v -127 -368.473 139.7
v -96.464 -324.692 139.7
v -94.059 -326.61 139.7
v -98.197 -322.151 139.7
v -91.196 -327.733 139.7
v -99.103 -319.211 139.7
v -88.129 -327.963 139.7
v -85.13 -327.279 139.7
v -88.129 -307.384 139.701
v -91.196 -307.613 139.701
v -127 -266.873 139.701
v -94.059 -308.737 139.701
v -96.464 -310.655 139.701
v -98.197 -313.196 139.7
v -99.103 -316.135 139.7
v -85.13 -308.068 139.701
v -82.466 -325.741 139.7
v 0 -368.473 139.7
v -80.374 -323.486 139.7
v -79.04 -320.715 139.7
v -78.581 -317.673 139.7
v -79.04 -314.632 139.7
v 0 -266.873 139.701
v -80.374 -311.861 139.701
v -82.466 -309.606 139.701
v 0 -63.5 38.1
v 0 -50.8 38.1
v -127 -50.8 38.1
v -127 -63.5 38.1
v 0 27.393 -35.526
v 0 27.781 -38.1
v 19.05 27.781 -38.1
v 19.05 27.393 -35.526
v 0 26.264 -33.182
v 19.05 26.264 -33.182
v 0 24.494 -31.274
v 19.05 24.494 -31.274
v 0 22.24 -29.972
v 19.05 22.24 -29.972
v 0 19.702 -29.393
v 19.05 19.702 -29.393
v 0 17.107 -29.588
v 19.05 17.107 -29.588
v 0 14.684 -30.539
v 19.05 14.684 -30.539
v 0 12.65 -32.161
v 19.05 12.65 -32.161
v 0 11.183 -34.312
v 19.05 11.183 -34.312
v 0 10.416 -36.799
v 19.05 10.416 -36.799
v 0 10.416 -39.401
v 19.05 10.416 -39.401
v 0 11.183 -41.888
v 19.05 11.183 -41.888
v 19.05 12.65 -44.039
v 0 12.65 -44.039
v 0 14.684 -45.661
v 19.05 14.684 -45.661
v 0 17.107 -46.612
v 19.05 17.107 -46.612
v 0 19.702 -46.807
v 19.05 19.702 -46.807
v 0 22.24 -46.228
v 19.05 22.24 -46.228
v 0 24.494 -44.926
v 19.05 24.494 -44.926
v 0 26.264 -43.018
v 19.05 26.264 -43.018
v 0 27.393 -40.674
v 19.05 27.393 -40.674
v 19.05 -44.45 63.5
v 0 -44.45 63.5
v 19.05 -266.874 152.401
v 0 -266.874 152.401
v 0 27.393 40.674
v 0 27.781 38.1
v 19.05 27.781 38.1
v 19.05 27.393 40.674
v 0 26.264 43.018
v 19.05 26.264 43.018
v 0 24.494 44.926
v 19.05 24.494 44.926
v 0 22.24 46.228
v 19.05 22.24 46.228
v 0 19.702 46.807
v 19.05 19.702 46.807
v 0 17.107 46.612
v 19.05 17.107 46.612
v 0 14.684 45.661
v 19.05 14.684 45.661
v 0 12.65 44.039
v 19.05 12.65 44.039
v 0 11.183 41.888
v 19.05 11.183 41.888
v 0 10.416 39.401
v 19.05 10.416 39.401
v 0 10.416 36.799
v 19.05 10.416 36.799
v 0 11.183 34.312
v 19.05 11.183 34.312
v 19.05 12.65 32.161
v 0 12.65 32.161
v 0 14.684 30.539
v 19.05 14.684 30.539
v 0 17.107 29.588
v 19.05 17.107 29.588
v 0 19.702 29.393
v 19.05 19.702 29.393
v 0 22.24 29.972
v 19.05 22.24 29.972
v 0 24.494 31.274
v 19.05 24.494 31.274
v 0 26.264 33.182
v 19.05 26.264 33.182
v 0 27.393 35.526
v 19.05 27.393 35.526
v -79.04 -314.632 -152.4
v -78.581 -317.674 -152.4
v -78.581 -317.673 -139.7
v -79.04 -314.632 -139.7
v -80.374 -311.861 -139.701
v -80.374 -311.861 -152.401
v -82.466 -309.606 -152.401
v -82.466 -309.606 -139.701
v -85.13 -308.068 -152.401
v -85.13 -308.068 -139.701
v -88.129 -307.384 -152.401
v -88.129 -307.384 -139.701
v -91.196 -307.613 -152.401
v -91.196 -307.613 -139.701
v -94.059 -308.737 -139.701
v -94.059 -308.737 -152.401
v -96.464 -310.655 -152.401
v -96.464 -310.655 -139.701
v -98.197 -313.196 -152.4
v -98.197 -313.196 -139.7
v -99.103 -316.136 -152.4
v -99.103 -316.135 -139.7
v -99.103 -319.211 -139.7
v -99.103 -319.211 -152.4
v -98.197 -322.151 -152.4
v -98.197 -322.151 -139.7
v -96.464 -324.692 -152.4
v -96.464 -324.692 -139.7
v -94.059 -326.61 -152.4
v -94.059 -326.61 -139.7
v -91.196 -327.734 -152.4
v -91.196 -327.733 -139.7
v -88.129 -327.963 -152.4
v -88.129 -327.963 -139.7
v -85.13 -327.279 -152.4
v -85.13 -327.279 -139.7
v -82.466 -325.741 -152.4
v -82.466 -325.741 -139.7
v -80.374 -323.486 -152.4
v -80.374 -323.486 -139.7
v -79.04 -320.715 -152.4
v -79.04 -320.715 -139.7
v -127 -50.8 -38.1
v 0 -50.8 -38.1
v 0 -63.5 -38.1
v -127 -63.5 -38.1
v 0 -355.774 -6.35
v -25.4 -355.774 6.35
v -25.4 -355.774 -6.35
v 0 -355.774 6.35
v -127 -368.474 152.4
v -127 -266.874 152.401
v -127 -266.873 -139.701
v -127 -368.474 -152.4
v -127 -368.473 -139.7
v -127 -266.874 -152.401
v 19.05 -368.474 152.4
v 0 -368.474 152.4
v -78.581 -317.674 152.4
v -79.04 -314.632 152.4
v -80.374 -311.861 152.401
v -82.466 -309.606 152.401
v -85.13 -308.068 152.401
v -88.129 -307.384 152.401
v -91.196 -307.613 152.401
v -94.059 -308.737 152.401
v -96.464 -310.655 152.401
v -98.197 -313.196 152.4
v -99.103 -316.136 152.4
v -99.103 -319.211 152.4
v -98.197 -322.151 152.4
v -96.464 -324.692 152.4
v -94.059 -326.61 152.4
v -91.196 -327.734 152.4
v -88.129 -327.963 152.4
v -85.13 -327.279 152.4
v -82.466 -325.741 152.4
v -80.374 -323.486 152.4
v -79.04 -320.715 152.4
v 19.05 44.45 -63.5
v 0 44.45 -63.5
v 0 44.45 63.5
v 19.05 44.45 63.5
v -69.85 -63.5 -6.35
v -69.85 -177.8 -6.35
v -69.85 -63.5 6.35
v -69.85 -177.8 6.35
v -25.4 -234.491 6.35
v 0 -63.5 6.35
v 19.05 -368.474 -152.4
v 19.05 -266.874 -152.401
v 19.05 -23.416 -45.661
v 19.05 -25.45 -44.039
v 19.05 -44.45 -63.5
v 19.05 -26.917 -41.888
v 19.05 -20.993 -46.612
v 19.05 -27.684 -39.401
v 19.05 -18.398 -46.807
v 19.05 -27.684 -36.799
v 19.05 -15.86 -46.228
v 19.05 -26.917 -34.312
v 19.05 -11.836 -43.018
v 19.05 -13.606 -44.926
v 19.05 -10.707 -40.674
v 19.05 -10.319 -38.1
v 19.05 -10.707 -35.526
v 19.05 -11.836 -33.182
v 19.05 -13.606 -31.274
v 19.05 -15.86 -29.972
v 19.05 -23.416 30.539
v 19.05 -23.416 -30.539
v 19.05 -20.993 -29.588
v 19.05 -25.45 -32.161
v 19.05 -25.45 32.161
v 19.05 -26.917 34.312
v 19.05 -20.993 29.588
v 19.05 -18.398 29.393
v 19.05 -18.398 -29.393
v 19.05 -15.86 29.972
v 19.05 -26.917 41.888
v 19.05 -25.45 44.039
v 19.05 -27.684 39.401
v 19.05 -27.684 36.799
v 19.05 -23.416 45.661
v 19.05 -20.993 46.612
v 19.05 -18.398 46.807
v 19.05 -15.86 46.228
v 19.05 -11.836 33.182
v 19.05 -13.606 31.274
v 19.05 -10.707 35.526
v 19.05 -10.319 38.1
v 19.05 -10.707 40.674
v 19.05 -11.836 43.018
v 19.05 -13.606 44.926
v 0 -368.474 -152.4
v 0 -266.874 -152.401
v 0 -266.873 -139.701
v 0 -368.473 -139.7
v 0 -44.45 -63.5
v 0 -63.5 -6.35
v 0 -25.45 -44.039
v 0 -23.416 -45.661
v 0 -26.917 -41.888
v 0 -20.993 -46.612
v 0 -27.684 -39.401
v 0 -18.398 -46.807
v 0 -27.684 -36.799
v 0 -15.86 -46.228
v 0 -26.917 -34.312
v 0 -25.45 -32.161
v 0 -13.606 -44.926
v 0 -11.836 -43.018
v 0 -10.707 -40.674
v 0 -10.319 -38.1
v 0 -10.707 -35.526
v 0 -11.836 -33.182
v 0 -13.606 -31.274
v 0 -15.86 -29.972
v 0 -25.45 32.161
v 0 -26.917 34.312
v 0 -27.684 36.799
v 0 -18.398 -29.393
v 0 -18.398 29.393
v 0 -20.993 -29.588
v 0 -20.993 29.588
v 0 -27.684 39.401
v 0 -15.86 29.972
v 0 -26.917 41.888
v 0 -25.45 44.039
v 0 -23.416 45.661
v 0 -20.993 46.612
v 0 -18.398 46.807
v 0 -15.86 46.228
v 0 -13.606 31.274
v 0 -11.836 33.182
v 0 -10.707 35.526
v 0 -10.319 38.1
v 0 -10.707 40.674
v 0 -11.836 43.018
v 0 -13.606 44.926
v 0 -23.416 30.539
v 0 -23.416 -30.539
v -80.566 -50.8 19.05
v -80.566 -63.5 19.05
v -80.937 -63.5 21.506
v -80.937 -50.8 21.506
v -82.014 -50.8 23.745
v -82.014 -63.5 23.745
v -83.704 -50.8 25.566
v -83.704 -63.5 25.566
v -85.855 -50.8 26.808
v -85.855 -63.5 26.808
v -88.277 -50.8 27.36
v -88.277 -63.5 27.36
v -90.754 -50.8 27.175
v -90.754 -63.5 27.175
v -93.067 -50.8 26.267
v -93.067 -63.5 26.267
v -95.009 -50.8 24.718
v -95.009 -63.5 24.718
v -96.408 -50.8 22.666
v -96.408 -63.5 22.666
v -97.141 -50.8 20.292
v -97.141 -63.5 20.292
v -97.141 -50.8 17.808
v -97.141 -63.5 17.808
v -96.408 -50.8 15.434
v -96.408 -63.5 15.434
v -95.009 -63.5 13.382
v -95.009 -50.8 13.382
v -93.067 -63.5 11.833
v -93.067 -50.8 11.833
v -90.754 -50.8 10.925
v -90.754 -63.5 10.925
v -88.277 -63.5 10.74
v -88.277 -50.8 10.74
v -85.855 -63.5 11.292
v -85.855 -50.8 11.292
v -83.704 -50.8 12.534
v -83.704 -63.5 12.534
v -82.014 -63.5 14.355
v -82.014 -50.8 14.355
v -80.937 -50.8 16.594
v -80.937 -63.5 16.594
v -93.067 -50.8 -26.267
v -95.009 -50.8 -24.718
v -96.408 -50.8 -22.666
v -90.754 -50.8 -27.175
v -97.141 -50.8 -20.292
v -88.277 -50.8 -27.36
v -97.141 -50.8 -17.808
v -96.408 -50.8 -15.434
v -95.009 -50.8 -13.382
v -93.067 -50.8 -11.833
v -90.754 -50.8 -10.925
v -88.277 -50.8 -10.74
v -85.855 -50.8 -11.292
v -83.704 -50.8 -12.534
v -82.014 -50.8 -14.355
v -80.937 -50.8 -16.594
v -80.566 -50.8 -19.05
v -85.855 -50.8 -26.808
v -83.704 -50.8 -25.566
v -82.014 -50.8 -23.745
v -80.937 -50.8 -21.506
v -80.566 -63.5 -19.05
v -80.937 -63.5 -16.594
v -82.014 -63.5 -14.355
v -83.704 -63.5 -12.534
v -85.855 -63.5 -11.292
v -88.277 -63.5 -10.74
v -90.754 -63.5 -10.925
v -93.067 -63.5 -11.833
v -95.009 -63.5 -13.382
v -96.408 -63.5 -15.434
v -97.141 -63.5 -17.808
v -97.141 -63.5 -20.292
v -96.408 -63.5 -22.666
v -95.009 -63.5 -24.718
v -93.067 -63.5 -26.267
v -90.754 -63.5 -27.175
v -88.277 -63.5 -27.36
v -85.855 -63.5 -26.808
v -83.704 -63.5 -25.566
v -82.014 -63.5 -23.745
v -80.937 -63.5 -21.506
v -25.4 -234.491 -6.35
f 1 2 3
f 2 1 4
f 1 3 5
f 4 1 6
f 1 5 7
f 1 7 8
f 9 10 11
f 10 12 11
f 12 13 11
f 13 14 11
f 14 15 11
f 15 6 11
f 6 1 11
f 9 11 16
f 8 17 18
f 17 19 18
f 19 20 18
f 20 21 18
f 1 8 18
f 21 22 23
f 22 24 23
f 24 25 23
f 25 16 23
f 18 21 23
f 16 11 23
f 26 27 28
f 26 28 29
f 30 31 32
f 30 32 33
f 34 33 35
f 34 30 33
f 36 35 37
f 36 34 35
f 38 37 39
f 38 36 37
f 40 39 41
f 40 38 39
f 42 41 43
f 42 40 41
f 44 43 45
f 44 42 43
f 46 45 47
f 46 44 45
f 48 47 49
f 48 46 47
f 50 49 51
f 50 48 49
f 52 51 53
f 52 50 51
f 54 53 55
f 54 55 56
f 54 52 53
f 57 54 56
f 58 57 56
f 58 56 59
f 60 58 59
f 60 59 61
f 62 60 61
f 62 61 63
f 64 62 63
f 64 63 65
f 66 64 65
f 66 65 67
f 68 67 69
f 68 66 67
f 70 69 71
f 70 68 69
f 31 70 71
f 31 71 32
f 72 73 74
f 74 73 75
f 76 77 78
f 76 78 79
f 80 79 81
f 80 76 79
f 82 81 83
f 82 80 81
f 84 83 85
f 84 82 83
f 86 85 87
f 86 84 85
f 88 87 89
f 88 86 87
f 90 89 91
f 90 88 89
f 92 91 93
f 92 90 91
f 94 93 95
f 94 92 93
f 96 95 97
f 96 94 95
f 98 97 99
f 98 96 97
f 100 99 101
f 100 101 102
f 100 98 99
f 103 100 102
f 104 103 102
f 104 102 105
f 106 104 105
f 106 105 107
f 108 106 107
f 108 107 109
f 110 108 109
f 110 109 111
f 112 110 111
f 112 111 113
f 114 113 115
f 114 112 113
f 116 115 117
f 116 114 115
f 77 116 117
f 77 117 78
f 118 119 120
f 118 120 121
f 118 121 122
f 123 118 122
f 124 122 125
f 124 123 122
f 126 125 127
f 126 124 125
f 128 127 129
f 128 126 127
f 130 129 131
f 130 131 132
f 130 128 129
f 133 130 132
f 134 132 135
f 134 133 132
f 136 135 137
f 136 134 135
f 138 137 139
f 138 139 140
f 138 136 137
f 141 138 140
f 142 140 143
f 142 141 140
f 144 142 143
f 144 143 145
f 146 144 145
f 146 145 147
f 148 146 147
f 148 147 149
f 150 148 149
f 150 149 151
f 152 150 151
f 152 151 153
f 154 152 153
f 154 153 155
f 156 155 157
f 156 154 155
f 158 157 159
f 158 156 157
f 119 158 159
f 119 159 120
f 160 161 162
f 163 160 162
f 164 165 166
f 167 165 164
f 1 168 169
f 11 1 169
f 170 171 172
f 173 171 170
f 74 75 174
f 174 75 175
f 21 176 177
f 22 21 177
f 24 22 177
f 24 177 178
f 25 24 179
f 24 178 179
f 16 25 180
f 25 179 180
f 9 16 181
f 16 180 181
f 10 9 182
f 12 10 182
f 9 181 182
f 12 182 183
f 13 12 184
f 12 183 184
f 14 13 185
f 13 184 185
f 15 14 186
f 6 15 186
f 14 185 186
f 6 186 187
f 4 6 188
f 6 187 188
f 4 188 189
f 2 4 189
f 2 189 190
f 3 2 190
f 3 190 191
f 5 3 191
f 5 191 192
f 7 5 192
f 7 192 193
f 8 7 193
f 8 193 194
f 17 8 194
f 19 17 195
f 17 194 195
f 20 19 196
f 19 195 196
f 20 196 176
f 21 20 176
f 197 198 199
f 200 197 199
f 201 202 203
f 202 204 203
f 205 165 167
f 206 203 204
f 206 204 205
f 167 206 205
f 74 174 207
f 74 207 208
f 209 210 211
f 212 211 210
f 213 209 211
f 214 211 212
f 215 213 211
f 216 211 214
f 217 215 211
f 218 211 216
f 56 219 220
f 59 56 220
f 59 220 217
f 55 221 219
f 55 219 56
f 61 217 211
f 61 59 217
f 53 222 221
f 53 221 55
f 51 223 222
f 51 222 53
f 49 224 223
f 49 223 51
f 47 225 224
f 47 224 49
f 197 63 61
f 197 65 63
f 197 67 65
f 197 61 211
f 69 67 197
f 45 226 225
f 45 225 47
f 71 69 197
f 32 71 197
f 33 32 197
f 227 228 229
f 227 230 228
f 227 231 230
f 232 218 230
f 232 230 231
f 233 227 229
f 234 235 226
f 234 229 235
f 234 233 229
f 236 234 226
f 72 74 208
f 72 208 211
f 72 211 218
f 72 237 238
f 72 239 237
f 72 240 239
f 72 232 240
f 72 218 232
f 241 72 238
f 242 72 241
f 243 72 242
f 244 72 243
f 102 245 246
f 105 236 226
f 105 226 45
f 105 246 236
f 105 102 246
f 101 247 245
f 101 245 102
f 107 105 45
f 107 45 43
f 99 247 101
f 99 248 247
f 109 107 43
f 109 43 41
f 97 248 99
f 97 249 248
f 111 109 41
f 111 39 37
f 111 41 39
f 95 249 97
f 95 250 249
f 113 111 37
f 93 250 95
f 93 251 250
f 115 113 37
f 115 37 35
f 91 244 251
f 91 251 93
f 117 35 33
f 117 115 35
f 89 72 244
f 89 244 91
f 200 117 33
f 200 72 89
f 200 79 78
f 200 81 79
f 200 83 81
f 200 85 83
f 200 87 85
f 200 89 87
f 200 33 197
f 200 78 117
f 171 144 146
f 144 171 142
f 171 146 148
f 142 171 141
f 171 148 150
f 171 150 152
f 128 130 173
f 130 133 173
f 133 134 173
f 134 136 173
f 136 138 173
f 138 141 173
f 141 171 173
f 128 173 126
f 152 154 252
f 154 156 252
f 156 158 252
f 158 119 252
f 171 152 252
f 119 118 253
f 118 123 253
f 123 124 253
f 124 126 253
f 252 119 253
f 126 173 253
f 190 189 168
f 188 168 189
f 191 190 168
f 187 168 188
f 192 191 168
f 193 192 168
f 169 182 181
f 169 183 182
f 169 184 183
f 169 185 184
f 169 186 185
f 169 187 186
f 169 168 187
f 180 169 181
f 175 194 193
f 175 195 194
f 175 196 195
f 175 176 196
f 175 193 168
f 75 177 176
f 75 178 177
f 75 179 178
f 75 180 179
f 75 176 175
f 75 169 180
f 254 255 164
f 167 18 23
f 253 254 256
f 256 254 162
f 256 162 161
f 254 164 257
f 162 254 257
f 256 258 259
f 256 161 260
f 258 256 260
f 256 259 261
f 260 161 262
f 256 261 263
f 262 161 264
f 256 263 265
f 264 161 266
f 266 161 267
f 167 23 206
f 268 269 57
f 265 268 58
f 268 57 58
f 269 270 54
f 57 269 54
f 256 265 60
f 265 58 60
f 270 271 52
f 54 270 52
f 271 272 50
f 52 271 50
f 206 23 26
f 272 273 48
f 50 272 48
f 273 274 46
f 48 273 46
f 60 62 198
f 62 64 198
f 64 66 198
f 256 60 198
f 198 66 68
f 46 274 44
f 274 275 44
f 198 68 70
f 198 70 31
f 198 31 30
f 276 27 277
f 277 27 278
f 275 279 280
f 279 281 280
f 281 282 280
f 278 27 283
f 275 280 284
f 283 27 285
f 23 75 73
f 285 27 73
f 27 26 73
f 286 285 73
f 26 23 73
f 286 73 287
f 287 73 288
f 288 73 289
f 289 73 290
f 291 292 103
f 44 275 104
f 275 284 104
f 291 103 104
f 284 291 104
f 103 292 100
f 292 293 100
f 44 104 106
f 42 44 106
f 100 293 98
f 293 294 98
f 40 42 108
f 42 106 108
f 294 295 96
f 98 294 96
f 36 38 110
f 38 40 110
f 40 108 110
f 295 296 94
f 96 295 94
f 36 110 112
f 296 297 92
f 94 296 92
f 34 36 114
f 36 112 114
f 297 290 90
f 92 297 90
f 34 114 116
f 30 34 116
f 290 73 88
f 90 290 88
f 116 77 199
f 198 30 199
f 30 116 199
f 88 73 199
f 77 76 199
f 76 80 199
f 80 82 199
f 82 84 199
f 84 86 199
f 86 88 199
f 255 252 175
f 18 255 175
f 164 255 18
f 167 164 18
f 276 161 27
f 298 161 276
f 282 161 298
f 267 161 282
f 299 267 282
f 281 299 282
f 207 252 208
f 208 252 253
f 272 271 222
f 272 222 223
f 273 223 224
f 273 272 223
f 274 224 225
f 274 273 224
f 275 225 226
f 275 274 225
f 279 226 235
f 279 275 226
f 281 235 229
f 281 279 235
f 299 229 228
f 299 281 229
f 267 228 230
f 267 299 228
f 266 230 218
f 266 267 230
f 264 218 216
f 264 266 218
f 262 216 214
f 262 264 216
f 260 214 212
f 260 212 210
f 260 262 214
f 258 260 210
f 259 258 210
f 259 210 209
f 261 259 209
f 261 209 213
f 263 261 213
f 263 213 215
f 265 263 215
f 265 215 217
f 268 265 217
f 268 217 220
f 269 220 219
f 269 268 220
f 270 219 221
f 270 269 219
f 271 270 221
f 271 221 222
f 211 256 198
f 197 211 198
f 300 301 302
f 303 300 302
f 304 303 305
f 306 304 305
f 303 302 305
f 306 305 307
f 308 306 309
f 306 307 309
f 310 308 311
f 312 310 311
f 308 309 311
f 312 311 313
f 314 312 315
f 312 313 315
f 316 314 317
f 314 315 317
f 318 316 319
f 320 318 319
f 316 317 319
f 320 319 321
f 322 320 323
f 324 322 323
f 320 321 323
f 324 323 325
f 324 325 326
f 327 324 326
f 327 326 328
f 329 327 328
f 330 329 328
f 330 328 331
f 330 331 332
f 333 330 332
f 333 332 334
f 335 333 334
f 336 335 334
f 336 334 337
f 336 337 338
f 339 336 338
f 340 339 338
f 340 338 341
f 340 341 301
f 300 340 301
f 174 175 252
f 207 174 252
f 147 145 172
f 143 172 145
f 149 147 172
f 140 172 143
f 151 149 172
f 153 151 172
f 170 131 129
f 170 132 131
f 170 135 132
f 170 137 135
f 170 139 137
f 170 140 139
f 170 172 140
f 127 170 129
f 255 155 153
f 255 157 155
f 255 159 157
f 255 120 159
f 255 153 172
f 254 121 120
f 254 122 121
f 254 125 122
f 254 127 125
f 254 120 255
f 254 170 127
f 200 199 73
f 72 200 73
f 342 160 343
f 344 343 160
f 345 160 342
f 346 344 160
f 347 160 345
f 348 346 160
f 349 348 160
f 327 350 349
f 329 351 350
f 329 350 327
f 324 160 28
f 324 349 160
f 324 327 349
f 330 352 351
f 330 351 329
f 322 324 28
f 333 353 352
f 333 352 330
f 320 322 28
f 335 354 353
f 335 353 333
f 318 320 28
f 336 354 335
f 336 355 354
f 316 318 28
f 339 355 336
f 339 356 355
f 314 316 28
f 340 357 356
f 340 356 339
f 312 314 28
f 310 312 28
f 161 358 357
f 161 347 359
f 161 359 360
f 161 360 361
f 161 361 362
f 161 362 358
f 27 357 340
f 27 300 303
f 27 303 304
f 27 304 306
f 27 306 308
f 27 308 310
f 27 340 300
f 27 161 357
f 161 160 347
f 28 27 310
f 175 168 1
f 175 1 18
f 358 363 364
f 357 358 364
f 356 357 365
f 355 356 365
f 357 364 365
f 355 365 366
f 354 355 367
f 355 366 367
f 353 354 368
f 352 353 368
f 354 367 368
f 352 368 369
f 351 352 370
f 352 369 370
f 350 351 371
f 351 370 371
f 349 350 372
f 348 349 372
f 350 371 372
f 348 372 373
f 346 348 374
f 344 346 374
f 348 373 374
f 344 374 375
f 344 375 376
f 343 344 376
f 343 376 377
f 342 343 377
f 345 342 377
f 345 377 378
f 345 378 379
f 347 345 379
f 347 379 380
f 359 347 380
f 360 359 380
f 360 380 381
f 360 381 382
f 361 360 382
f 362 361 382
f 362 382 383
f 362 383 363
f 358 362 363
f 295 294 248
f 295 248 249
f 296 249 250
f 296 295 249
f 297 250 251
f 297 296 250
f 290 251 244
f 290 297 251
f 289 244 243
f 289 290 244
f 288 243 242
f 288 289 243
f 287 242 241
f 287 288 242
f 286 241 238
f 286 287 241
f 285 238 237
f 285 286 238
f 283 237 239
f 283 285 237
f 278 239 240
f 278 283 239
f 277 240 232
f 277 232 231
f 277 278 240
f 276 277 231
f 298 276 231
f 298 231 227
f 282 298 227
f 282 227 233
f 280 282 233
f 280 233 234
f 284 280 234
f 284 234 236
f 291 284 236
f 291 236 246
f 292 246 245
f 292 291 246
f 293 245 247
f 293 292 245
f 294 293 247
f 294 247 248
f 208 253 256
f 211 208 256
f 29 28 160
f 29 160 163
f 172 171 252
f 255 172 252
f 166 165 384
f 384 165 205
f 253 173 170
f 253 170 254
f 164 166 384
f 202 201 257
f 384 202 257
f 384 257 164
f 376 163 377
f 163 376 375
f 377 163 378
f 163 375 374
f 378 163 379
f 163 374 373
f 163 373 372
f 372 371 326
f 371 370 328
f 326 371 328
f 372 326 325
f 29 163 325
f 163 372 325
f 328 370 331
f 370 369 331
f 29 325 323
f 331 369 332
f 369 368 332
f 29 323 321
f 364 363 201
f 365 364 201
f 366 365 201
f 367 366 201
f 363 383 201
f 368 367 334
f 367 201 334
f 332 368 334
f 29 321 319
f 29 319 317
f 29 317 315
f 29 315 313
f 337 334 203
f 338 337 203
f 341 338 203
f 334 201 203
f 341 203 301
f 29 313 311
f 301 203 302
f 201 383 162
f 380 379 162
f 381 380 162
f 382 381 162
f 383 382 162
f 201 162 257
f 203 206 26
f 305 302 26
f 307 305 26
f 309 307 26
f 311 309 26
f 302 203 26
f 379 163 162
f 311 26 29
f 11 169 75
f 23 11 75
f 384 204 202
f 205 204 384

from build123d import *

# Parameters (mm, degrees)
F0_R     = 8.73125
F1_DEPTH = 19.05
F2_W     = 127
F2_H     = 101.6000000041
F2_R     = 10.31875
F3_DEPTH = 12.7
F5_W     = 25.4
F5_H     = 121.2828524489
F5_W_2   = 69.85
F5_H_2   = 114.3
F6_DEPTH = 6.35
F7_W     = 12.7
F7_H     = 76.2
F8_DEPTH = 127
F10_D    = 16.66748


with BuildPart() as f1:
    # F0 (on Right) → F1 (new body)
    with BuildSketch(Plane.YZ):
        Polygon((44.45, 63.5), (-44.45, 63.5), (-266.8735152621, 152.4009127194), (-368.4735152621, 152.4), (-368.4735152621, -152.4), (-266.8735152621, -152.4009127194), (-44.45, -63.5), (44.45, -63.5), align=None)
        with Locations((-19.05, -38.1)):
            Circle(F0_R, mode=Mode.SUBTRACT)
        with Locations((19.05, -38.1)):
            Circle(F0_R, mode=Mode.SUBTRACT)
        with Locations((-19.05, 38.1)):
            Circle(F0_R, mode=Mode.SUBTRACT)
        with Locations((19.05, 38.1)):
            Circle(F0_R, mode=Mode.SUBTRACT)
    extrude(amount=F1_DEPTH)

    # F2 (on face) → F3 (join)
    with BuildSketch(Plane(origin=(0, -0.0013691088, 152.4033101543), x_dir=(1, 0, 0), z_dir=(0, -8.9835e-06, 1))):
        with Locations((-63.5, -317.6721461661)):
            Rectangle(F2_W, F2_H)
        with Locations((-88.9, -317.6721461661)):
            Circle(F2_R, mode=Mode.SUBTRACT)
    extrude(amount=-F3_DEPTH)

    # F4: F1 across plane


with BuildPart() as f1_1:
    add(f1.part)
    add(f1.part.mirror(Plane.XY))

    # F5 (on Top) → F6 (join, symmetric)
    with BuildSketch(Plane.XY):
        with Locations((-12.7, -295.1320890376)):
            Rectangle(F5_W, F5_H)
        Polygon((-25.4, -234.4906628132), (0, -234.4906628132), (0, -177.8), (-69.85, -177.8), align=None)
        with Locations((-34.925, -120.65)):
            Rectangle(F5_W_2, F5_H_2)
    extrude(amount=F6_DEPTH, both=True)

    # F7 (on face) → F8 (join)
    with BuildSketch(Plane(origin=(0, 0, 0), x_dir=(0, -1, 0), z_dir=(-1, 0, 0))):
        with Locations((57.15, 0)):
            Rectangle(F7_W, F7_H)
    extrude(amount=F8_DEPTH)

    # F10 (through all)
    with Locations(Plane(origin=(0, -50.8, 0), x_dir=(-1, 0, 0), z_dir=(0, 1, 0))):
        with Locations((88.9, 19.05), (88.9, -19.05)):
            Hole(F10_D / 2)


solid = f1_1.part
